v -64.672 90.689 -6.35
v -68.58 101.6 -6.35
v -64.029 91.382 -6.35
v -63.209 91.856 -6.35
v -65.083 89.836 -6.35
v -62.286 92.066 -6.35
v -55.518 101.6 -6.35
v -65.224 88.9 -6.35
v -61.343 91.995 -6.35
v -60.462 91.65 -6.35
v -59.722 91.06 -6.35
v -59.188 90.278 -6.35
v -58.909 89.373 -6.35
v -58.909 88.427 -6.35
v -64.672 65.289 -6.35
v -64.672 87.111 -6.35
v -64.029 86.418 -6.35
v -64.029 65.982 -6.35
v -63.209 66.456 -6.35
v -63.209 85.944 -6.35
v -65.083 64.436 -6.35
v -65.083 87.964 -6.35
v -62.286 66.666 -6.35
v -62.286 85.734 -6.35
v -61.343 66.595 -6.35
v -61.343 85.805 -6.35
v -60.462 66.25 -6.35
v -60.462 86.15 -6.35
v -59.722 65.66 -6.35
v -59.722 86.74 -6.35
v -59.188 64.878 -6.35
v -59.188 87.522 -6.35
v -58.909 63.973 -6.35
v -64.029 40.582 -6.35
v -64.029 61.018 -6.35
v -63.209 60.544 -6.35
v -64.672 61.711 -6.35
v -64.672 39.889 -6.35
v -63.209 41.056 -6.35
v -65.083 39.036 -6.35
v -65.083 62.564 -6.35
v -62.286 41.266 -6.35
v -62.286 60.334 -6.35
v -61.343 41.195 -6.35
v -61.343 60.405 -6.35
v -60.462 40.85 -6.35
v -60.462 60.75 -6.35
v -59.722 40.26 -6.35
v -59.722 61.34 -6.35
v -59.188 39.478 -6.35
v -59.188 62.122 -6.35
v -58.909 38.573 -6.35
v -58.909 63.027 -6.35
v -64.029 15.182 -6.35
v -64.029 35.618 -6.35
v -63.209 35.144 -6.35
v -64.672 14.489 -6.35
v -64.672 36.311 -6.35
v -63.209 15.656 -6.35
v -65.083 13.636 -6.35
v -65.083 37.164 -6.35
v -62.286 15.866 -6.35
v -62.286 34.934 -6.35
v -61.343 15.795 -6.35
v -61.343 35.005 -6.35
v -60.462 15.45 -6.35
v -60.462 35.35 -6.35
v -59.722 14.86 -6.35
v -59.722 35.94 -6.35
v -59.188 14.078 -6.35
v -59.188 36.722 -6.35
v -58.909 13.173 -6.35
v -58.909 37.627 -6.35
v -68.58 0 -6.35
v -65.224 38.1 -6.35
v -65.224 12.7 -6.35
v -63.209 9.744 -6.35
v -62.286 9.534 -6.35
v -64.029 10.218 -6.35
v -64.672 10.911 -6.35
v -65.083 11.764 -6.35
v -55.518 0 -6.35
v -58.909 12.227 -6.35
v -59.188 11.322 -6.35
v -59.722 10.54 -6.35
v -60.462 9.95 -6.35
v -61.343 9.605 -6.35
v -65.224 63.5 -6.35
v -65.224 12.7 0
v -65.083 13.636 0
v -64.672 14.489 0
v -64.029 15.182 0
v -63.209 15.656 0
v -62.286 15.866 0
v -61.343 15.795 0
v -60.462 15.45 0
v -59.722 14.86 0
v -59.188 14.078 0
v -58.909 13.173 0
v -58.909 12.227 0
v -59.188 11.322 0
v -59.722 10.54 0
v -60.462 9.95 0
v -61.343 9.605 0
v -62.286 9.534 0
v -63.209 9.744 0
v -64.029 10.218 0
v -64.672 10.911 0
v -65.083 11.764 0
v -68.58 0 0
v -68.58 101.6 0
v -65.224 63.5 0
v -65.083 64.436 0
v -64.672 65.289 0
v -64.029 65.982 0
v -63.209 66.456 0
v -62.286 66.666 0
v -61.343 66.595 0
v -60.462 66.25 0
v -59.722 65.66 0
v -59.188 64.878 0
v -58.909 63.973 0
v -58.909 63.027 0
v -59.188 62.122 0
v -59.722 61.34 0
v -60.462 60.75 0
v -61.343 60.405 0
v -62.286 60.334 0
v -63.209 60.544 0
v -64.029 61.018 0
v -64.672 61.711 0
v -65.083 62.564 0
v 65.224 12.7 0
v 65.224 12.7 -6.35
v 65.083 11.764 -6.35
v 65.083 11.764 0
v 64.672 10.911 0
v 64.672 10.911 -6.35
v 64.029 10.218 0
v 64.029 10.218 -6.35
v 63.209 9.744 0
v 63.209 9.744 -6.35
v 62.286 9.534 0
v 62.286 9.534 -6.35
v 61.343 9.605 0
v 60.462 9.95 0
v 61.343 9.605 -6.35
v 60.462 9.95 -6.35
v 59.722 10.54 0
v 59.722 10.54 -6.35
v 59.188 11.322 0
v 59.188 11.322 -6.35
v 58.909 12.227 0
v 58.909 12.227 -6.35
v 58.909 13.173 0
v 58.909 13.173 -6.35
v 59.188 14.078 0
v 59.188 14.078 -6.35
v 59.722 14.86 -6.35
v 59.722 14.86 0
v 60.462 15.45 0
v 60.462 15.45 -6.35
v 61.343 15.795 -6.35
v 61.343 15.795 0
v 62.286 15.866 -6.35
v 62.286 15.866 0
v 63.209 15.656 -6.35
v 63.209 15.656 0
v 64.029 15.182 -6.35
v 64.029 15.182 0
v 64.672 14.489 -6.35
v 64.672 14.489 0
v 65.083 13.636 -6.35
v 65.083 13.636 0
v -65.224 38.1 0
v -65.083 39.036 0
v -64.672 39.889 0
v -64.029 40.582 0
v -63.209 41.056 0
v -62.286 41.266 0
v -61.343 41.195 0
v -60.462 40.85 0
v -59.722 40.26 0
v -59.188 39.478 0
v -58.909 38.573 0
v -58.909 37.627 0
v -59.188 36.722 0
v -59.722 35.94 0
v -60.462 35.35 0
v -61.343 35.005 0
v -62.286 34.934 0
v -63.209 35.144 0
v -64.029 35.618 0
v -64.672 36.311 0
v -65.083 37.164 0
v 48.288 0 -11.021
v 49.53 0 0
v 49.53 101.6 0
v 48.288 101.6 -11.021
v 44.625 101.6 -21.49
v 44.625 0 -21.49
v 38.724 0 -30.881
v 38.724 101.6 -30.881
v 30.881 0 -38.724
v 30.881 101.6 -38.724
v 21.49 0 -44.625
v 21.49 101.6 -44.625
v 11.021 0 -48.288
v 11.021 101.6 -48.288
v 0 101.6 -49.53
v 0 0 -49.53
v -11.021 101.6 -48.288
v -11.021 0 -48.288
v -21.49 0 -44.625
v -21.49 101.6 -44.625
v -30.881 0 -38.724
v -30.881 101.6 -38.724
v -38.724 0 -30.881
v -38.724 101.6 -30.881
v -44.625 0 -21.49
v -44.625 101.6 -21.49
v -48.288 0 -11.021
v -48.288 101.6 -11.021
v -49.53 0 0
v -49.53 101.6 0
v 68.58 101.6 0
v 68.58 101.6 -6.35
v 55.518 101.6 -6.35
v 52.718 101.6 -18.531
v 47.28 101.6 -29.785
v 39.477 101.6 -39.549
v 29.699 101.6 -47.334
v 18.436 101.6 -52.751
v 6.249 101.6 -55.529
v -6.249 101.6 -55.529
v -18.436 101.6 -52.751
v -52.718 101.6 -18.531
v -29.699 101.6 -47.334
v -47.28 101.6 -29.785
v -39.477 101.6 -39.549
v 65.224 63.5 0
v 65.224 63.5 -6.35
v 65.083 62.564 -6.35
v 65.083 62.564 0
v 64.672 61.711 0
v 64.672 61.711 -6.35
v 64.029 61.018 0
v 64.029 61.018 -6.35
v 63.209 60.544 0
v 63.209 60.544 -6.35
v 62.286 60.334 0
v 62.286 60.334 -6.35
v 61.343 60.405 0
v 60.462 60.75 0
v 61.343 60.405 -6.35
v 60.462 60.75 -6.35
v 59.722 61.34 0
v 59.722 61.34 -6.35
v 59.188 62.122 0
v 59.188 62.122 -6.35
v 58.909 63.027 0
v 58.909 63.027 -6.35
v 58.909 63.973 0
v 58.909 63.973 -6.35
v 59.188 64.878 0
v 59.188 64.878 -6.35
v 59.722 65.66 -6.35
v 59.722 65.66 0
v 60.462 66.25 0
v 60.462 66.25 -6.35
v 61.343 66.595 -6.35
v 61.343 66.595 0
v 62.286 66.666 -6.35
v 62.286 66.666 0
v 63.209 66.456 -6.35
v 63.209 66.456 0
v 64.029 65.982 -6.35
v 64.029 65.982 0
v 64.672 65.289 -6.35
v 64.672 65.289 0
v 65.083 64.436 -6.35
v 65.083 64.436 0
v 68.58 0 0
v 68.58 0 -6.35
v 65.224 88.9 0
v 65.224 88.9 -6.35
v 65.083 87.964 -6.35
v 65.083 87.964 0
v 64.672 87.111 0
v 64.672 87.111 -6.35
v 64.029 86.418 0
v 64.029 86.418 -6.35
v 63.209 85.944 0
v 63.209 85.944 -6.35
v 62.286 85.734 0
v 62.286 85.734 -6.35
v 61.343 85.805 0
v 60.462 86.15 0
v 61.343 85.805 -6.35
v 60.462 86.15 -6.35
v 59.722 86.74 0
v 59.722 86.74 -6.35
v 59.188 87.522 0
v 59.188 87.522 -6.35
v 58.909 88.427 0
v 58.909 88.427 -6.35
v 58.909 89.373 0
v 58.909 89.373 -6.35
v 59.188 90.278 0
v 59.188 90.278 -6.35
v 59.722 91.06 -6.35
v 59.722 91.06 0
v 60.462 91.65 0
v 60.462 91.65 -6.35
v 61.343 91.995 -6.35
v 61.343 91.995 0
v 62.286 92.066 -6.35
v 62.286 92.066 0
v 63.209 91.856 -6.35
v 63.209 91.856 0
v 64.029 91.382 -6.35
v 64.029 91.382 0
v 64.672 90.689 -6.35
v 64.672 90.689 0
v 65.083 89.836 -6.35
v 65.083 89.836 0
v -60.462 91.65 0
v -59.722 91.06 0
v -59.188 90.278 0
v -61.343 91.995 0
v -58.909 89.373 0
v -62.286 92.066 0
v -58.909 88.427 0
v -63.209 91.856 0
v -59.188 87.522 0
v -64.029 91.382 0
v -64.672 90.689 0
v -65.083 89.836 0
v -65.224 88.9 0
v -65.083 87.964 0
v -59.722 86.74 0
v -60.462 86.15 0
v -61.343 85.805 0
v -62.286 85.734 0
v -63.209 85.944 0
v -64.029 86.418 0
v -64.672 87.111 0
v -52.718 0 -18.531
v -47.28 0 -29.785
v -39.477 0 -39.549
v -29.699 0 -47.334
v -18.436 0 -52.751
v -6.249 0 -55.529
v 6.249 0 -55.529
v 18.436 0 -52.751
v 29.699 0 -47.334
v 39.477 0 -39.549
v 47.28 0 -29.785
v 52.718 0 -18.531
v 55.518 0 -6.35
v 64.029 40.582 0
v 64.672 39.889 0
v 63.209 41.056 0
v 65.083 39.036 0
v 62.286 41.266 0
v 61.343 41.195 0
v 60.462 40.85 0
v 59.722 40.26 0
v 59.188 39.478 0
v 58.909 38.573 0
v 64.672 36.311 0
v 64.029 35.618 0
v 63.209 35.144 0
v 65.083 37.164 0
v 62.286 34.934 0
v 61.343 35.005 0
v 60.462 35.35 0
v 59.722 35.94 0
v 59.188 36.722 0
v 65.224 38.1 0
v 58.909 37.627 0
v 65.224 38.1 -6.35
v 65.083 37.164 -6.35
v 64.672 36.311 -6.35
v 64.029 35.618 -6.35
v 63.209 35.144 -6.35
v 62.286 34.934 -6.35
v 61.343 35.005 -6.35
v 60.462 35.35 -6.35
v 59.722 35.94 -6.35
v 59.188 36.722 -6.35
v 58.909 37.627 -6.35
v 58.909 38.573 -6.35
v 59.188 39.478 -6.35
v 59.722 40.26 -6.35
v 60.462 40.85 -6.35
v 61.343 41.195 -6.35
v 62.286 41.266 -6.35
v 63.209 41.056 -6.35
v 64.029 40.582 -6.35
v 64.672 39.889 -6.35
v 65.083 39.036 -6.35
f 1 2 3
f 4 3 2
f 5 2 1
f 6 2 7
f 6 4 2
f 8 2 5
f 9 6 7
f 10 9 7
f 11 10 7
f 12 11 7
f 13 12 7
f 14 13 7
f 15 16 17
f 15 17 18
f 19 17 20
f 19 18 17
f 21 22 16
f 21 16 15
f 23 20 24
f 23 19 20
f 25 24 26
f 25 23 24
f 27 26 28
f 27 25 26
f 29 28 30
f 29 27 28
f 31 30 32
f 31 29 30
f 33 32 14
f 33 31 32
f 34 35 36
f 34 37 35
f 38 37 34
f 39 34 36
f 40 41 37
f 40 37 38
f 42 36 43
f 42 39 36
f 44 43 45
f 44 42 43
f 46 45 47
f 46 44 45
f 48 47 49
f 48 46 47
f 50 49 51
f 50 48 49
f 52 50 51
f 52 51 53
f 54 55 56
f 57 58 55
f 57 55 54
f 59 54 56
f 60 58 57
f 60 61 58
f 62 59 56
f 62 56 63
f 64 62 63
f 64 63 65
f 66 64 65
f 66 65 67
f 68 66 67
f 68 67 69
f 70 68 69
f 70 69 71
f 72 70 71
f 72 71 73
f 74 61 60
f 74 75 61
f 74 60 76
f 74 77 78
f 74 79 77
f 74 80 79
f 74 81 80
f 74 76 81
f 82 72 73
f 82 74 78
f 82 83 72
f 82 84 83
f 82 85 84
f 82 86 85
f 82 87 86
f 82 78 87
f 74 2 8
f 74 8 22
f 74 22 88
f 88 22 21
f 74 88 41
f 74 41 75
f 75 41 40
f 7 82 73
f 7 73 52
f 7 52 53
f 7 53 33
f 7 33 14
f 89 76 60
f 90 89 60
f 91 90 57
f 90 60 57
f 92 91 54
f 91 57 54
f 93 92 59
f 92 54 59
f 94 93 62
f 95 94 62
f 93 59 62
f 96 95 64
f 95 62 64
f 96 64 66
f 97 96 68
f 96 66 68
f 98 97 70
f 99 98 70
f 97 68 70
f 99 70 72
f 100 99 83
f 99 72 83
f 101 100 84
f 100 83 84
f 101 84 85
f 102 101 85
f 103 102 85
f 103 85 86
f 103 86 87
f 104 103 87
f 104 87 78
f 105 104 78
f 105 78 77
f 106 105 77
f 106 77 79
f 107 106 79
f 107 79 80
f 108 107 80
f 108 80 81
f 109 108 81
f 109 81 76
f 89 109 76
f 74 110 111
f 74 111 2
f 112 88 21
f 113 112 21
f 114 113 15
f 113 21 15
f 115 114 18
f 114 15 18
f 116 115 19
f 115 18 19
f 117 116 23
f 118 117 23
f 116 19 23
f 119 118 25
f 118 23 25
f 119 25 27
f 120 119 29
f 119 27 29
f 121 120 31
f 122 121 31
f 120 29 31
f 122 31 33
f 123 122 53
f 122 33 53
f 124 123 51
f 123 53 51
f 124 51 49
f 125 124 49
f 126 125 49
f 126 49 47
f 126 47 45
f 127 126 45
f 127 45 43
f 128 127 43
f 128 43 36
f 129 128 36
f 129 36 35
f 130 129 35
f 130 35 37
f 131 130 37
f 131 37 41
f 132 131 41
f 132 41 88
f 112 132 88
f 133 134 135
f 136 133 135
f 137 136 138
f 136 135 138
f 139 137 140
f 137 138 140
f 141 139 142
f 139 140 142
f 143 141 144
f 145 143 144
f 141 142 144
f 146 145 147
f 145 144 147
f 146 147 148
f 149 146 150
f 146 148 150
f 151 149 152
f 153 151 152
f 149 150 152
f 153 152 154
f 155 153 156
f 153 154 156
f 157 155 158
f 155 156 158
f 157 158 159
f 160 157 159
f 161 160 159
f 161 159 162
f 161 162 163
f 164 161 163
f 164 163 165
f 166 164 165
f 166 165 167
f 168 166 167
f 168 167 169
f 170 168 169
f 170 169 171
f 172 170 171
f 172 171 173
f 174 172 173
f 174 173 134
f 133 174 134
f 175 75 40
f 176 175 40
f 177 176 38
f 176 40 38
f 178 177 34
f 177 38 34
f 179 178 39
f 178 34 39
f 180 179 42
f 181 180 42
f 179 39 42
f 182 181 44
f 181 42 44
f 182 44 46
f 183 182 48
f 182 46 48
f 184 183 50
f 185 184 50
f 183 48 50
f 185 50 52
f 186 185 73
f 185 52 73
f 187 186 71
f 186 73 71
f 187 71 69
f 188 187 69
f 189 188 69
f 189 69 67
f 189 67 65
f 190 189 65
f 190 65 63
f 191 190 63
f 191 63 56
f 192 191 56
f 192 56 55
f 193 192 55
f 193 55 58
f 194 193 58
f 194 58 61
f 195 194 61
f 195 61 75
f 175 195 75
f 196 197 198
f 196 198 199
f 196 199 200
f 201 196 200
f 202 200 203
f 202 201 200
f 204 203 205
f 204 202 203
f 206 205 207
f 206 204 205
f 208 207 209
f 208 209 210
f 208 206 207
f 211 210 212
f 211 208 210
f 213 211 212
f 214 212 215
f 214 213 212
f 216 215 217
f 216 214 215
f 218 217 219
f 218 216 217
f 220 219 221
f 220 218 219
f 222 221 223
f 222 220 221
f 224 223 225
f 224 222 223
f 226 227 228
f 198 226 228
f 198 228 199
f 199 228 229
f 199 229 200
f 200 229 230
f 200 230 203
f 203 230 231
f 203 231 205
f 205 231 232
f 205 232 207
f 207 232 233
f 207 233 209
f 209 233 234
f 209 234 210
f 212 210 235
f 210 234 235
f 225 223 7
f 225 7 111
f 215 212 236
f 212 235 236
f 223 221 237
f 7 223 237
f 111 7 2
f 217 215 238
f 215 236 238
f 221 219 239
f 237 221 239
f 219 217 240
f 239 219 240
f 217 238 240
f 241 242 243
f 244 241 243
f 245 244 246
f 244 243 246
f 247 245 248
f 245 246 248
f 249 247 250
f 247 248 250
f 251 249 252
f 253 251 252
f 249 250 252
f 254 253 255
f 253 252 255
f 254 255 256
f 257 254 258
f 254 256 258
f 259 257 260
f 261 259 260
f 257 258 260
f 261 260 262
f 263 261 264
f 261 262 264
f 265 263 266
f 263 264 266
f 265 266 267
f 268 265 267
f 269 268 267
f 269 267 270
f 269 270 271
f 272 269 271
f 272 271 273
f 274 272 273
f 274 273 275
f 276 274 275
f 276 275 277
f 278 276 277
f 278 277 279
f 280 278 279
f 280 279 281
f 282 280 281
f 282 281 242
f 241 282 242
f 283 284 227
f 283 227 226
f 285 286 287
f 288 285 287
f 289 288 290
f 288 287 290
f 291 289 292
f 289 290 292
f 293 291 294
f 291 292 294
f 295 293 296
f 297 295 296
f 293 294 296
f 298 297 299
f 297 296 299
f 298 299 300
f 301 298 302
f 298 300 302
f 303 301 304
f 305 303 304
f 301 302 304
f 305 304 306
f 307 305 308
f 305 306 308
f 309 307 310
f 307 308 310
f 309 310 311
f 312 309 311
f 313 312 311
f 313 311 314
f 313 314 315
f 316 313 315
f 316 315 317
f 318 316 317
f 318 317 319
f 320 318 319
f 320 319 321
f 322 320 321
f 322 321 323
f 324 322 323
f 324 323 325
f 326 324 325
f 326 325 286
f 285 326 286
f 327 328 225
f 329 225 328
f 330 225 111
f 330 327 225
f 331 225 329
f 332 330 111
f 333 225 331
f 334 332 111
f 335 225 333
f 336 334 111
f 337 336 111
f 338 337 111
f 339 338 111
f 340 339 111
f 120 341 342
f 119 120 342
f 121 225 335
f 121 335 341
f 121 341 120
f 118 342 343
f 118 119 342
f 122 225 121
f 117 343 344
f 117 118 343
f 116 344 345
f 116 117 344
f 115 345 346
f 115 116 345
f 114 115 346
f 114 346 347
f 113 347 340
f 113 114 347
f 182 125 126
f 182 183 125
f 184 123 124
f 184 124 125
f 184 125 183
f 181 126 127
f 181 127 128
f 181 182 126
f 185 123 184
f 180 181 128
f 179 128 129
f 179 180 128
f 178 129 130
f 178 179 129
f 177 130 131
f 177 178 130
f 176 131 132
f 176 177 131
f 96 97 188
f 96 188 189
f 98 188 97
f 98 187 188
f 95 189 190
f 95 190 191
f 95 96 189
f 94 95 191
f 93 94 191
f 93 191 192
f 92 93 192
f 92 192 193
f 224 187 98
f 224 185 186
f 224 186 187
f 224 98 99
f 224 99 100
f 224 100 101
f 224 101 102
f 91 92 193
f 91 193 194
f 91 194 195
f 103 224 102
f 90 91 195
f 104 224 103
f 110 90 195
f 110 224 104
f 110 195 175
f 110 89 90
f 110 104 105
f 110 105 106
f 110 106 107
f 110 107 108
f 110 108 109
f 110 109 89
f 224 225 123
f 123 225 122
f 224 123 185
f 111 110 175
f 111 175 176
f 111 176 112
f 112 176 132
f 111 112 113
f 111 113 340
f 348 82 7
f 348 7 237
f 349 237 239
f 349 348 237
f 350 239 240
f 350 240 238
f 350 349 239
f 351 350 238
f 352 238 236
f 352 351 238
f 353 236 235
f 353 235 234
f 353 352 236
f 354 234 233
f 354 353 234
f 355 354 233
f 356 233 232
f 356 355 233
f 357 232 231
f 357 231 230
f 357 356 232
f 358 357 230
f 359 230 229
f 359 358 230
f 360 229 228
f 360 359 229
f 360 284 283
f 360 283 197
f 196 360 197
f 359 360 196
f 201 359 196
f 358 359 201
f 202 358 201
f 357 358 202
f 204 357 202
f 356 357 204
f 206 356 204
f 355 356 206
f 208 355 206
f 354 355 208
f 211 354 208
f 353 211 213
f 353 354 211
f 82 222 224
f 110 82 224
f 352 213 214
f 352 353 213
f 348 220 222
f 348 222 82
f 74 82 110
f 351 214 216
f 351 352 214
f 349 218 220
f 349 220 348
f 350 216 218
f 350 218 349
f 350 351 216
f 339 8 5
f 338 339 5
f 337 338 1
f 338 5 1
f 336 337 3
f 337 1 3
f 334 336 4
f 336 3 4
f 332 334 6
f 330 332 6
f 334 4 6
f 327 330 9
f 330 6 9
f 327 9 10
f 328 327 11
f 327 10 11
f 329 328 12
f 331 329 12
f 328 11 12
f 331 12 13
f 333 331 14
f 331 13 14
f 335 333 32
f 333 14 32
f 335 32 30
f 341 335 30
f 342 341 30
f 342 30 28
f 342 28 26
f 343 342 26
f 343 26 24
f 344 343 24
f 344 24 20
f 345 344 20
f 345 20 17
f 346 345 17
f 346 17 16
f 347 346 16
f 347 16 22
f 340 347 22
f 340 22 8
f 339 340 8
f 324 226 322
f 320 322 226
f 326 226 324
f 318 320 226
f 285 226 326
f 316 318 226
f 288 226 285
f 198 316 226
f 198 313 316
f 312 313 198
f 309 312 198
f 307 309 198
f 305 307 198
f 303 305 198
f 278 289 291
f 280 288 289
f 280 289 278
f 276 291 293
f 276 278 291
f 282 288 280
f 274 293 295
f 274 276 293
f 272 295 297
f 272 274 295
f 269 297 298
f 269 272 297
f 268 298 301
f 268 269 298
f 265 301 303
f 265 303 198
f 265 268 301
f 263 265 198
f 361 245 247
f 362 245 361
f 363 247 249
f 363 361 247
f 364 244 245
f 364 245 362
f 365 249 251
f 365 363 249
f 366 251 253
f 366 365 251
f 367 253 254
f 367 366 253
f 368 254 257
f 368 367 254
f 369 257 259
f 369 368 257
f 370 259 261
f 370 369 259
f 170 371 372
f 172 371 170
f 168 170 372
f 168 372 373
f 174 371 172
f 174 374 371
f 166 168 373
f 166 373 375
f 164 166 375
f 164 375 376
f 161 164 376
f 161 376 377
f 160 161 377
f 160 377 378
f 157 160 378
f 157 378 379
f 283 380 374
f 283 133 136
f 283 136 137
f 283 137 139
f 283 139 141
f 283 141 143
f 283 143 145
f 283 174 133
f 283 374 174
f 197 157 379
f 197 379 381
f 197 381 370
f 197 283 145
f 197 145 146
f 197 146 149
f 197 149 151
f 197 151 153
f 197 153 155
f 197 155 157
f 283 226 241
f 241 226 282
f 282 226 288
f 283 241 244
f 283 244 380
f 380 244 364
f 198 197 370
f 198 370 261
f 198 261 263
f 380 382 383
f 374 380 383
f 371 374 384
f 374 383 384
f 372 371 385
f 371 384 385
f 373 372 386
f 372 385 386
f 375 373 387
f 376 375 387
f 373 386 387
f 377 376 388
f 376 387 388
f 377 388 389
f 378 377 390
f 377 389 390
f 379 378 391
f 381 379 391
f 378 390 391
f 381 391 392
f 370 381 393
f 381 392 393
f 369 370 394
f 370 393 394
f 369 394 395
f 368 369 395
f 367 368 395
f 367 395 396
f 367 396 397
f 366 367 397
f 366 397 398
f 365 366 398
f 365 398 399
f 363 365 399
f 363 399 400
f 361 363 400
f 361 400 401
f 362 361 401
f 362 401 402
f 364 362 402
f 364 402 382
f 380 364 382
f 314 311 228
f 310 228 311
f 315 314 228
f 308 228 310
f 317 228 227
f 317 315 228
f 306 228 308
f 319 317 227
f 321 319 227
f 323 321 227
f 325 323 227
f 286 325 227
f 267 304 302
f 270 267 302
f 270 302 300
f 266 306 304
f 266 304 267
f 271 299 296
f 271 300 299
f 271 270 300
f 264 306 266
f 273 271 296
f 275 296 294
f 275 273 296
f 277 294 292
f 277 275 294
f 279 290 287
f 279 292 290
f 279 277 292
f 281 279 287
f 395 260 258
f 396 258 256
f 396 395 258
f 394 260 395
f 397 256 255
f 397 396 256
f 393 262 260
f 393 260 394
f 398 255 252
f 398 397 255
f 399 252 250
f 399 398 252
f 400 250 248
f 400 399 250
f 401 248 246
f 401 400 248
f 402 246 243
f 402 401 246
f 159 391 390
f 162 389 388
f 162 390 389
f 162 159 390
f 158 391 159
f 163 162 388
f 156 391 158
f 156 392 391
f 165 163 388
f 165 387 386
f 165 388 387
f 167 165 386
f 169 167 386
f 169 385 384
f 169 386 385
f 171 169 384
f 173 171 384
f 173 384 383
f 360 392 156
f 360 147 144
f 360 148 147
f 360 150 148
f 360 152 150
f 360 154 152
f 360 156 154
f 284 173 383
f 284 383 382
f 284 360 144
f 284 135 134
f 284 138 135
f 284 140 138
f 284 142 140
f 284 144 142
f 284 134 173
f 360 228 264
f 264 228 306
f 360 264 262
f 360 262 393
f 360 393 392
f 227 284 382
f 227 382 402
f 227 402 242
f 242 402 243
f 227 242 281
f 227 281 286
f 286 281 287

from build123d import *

# Parameters (mm, degrees)
BOSS_EXTRUDE1_DEPTH = 101.6
SKETCH2_R           = 3.175
CUT_EXTRUDE1_DEPTH  = 133.208158977


with BuildPart() as part:
    # Sketch1 → Boss-Extrude1 (new body)
    with BuildSketch(Plane(origin=(0, 0, 0), x_dir=(1, 0, 0), z_dir=(0, 1, 0))):
        with BuildLine():
            Line((55.518032206, 6.35), (68.58, 6.35))
            Line((68.58, 6.35), (68.58, 0))
            Line((68.58, 0), (49.53, 0))
            ThreePointArc((49.53, 0), (0, 49.53), (-49.53, 0))
            Line((-49.53, 0), (-68.58, 0))
            Line((-68.58, 0), (-68.58, 6.35))
            Line((-68.58, 6.35), (-55.518032206, 6.35))
            ThreePointArc((-55.518032206, 6.35), (0, 55.88), (55.518032206, 6.35))
        make_face()
    extrude(amount=BOSS_EXTRUDE1_DEPTH)

    # Sketch2 → Cut-Extrude1 (cut, through all)
    with BuildSketch(Plane(origin=(0, 0, -6.35), x_dir=(-1, 0, 0), z_dir=(0, 0, -1))):
        with Locations((62.049016103, 88.9)):
            Circle(SKETCH2_R)
        with Locations((62.049016103, 63.5)):
            Circle(SKETCH2_R)
        with Locations((62.049016103, 38.1)):
            Circle(SKETCH2_R)
        with Locations((62.049016103, 12.7)):
            Circle(SKETCH2_R)
        with Locations(Location((-62.049016103, 12.7, 0), (0, 0, 180))):
            Circle(SKETCH2_R)
        with Locations(Location((-62.049016103, 38.1, 0), (0, 0, 180))):
            Circle(SKETCH2_R)
        with Locations(Location((-62.049016103, 63.5, 0), (0, 0, 180))):
            Circle(SKETCH2_R)
        with Locations(Location((-62.049016103, 88.9, 0), (0, 0, 180))):
            Circle(SKETCH2_R)
    extrude(amount=-CUT_EXTRUDE1_DEPTH, mode=Mode.SUBTRACT)


solid = part.part
